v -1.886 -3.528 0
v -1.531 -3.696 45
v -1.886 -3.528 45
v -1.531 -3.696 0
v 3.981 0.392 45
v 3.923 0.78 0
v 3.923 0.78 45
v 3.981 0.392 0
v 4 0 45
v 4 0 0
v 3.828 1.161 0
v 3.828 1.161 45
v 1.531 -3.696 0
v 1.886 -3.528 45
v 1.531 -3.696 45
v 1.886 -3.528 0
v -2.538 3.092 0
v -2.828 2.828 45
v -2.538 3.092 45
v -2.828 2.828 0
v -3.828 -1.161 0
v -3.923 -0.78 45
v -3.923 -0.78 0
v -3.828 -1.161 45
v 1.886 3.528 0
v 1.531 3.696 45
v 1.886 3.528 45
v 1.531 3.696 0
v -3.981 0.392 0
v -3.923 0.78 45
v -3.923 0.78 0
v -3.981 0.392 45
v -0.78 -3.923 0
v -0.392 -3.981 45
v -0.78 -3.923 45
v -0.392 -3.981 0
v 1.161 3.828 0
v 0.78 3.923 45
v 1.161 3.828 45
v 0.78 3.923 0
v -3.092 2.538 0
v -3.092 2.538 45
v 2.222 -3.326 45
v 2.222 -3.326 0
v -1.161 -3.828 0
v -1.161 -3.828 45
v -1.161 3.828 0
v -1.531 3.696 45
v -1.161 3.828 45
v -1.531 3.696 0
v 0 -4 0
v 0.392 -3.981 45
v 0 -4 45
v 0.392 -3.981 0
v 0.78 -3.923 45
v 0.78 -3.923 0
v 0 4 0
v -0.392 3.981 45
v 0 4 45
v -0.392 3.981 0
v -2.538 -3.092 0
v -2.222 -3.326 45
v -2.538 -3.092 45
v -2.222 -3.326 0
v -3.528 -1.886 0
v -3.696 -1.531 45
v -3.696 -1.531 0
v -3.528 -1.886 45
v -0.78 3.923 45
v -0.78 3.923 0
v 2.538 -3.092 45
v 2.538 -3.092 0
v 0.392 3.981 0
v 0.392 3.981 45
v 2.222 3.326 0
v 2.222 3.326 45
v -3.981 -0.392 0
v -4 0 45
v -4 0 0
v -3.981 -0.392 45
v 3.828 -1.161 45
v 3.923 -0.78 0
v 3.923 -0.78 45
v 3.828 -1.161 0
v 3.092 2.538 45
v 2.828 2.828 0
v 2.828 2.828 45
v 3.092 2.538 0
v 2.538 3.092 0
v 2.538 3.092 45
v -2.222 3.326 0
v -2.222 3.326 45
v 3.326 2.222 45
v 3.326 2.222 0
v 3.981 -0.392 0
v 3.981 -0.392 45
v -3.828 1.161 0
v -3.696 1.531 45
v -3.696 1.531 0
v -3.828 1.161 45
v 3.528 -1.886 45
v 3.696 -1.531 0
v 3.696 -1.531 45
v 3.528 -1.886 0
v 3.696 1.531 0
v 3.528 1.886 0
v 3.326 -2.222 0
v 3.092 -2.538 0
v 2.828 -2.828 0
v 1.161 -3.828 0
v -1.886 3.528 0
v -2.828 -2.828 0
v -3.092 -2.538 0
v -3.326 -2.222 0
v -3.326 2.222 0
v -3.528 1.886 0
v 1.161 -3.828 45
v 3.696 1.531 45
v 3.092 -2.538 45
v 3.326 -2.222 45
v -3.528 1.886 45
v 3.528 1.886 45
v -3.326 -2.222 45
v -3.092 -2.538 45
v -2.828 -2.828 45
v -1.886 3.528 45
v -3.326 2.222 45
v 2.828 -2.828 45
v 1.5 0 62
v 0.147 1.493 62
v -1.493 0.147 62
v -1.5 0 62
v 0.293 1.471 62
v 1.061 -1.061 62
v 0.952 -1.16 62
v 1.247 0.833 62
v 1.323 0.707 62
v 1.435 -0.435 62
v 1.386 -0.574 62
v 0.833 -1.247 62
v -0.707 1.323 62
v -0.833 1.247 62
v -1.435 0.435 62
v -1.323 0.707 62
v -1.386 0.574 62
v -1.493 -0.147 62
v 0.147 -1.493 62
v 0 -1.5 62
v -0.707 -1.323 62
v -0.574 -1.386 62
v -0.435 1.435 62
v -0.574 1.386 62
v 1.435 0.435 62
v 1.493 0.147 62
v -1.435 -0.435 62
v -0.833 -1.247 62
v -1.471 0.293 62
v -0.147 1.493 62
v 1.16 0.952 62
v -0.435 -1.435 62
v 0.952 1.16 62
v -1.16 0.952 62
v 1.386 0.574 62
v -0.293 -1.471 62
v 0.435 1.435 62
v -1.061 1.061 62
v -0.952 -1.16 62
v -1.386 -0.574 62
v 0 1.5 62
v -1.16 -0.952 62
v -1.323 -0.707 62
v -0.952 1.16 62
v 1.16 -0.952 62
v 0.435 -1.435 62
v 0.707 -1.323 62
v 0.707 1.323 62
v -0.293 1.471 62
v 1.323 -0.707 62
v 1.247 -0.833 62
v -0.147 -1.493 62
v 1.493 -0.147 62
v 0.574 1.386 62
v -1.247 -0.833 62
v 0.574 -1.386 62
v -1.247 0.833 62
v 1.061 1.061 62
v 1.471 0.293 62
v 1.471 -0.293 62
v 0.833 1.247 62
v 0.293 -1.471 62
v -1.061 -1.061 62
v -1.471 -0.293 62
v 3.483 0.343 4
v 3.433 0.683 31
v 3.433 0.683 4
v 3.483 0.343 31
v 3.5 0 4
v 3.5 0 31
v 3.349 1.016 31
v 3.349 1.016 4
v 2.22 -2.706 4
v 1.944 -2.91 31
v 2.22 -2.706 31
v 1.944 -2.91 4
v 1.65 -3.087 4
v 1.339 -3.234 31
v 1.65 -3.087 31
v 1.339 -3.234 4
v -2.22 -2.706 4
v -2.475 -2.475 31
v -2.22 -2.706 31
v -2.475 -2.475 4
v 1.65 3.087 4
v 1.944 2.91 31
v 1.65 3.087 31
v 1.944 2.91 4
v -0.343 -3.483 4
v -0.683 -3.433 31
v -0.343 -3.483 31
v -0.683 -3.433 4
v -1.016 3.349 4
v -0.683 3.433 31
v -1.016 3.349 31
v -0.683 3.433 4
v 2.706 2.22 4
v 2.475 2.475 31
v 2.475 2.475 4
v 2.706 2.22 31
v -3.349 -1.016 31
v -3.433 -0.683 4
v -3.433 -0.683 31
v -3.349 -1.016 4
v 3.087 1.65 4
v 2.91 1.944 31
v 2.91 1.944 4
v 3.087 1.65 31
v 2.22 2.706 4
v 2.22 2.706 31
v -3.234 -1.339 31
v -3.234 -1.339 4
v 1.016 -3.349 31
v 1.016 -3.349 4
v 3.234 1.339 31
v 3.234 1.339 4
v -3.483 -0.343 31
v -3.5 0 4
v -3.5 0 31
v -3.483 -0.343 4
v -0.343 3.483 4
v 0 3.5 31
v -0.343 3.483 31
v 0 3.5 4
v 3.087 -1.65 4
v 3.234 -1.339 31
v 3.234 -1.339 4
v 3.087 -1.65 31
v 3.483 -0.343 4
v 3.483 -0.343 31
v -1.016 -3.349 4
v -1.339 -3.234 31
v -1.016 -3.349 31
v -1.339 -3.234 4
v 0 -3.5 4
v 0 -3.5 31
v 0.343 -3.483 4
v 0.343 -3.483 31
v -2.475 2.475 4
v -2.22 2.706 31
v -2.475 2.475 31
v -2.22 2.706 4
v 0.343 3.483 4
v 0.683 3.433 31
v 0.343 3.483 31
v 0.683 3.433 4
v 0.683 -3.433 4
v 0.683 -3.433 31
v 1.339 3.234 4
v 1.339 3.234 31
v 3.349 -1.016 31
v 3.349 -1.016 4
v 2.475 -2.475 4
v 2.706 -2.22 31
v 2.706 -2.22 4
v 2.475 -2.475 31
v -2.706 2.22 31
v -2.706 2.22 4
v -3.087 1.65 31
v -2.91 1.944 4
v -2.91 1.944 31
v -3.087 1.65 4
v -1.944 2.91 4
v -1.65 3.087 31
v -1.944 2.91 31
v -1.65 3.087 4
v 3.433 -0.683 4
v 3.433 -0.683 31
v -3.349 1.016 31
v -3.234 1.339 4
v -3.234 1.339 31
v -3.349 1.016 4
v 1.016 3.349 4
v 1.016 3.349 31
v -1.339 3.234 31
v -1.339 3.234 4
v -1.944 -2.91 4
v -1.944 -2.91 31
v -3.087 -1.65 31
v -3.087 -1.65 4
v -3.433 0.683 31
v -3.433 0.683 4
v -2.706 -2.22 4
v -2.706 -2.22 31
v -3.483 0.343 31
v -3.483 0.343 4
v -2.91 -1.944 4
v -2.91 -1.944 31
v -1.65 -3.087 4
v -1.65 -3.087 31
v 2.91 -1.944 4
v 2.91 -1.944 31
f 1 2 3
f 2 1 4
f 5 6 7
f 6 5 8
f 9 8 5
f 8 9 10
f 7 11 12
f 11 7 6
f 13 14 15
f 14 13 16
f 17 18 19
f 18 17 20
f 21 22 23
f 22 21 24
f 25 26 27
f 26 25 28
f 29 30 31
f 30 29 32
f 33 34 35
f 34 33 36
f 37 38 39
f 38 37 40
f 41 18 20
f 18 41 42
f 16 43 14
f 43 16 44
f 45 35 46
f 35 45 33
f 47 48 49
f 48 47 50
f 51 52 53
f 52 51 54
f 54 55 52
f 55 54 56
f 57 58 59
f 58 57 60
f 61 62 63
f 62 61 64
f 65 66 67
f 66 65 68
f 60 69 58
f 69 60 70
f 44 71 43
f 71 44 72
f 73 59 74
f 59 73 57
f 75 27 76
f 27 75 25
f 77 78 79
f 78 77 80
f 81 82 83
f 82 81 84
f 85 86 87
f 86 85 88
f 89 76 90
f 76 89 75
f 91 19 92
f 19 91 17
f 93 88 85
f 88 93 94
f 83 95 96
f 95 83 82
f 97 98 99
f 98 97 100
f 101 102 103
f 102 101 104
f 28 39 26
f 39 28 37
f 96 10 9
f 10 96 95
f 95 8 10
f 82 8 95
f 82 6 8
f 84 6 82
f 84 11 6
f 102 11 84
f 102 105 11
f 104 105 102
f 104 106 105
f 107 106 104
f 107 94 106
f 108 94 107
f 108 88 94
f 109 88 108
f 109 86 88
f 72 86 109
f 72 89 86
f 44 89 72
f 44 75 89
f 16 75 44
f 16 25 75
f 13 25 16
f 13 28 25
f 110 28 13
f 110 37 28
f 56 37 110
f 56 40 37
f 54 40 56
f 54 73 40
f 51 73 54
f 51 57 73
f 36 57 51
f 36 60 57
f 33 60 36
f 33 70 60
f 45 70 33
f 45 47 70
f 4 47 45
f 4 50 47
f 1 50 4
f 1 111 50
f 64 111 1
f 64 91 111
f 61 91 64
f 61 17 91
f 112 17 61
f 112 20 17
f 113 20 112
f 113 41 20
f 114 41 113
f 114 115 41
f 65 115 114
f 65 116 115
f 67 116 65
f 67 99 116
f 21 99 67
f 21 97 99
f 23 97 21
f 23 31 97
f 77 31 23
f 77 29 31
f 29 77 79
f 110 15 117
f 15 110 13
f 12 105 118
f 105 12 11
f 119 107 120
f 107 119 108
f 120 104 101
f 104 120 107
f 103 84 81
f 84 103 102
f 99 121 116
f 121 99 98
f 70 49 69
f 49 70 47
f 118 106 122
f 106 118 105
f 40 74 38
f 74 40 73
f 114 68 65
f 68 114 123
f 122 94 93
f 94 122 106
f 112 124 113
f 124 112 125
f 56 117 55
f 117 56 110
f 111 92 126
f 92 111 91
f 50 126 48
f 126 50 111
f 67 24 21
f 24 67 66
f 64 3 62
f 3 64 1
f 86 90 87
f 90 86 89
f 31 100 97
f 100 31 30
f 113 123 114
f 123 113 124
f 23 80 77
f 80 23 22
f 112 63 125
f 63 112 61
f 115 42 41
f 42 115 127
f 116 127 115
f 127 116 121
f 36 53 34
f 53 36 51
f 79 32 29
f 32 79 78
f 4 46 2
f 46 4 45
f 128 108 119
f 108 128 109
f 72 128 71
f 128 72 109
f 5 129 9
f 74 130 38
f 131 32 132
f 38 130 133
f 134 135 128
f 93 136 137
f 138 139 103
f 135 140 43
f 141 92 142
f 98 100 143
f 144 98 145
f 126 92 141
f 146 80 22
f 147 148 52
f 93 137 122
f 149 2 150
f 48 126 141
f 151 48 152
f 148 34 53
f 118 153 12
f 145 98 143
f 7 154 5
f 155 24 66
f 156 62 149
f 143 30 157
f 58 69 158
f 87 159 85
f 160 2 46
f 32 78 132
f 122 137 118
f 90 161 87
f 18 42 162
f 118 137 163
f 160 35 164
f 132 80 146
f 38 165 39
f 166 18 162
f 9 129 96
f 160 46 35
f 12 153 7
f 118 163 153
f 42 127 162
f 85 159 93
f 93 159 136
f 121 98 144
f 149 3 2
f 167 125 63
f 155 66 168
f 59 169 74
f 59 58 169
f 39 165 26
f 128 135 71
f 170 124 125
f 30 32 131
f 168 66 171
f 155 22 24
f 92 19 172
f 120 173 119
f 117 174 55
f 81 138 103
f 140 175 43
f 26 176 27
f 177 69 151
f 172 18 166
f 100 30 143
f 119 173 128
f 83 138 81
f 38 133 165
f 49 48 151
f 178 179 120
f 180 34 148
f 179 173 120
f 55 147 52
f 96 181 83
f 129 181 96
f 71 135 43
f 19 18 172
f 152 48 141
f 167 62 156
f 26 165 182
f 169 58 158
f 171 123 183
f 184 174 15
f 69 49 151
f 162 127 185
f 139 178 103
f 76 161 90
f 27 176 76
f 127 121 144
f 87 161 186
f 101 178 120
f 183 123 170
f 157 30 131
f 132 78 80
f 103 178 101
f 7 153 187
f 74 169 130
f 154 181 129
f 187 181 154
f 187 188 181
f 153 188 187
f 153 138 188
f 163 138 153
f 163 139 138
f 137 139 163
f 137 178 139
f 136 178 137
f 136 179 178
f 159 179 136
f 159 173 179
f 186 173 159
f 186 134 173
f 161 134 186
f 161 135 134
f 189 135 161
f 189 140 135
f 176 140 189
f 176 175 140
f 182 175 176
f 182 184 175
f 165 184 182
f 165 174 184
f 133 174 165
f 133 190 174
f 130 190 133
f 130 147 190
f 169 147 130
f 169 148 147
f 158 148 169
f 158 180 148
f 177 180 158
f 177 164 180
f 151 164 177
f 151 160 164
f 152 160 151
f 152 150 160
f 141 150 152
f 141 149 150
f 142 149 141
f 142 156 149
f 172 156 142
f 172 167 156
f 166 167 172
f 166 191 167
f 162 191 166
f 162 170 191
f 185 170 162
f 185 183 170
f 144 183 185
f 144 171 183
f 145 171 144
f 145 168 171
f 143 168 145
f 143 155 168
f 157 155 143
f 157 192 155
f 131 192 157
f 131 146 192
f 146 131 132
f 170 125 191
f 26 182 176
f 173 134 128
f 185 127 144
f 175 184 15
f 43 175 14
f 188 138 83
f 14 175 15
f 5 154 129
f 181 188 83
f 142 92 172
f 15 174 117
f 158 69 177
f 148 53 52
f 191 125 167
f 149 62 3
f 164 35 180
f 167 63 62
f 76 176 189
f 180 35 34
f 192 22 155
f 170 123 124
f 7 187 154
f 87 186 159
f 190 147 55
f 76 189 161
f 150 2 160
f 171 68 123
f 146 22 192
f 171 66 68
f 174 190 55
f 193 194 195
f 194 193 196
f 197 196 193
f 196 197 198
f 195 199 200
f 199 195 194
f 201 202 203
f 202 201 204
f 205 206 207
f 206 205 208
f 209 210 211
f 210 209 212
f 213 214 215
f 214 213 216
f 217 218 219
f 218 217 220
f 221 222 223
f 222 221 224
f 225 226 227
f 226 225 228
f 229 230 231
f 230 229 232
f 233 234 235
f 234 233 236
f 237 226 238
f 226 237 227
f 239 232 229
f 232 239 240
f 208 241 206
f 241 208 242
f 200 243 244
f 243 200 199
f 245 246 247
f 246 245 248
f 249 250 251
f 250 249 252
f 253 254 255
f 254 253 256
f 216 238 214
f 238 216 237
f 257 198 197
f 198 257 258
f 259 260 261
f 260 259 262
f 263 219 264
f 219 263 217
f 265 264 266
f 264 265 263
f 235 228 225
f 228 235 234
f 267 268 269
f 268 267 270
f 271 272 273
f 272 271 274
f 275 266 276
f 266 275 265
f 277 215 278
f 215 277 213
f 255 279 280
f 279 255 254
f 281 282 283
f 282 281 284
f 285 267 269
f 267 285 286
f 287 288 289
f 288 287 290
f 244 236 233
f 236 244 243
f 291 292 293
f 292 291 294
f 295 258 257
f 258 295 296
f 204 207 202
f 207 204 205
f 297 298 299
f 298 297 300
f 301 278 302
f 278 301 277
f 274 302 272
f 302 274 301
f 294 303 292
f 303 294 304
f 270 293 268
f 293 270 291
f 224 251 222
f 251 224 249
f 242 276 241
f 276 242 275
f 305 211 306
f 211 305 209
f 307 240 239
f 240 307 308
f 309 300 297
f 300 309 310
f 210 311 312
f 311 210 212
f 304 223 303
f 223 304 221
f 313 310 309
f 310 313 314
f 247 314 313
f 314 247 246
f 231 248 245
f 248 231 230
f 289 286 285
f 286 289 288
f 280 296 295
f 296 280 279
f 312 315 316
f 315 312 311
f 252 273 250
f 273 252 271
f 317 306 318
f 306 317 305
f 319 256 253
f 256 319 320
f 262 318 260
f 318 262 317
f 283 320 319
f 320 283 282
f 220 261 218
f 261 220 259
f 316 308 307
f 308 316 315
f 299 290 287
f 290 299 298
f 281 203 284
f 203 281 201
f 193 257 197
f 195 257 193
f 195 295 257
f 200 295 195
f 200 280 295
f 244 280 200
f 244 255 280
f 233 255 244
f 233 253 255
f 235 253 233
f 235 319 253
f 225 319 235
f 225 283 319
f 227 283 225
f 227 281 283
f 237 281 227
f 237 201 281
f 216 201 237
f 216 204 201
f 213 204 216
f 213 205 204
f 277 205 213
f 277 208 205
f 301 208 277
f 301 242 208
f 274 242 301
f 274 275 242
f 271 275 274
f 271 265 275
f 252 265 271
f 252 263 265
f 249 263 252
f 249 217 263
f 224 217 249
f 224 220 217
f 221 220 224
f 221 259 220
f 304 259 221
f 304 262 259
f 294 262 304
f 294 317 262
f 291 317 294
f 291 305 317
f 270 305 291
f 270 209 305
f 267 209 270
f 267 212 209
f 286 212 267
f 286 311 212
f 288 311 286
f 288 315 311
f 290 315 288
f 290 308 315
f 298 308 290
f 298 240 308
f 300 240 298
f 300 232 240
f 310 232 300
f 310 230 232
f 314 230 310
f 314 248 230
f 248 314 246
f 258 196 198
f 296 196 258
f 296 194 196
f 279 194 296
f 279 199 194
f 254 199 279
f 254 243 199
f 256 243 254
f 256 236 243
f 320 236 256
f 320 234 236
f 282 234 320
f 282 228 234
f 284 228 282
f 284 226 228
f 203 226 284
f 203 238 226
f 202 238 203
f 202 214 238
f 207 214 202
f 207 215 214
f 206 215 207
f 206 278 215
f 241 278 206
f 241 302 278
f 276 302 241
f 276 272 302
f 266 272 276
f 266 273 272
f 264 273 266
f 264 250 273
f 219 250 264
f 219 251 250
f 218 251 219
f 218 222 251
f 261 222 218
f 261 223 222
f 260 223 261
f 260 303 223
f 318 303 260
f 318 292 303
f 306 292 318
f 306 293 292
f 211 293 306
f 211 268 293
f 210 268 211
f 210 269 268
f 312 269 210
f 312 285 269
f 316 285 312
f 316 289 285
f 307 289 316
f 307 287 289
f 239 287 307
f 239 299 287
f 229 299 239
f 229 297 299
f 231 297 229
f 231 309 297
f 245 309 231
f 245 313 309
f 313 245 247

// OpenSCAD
// Pestle for 1.5 mL microcentrifuge tube - printed standing upright.
// Dimensions in mm.

// Handle
h_d      = 8;      // Handle diameter
h_start  = 0;      // Handle start Z
h_end    = 45;     // Handle end Z

// Cone
c_d_top  = 8;      // Cone top diameter (at z=45)
c_d_bot  = 3;      // Cone bottom diameter (at z=62)
c_start  = 45;     // Cone start Z
c_end    = 62;     // Cone end Z

// Tip
tip_d    = 3;      // Tip diameter
tip_c    = 62;     // Tip center Z

// Grooves
g_count  = 4;      // Number of grooves
g_z      = [10, 15, 20, 25]; // Z positions of groove centers
g_w      = 2;      // Groove width (Z)
g_d      = 1;      // Groove depth

$fn = 64;

// Main body: Handle + Cone + Tip
difference() {
    union() {
        // 1. Cylindrical Handle
        translate([0, 0, h_start])
            cylinder(h = h_end - h_start, d = h_d);

        // 2. Cone (tapering from 8mm to 3mm)
        translate([0, 0, c_start])
            cylinder(h = c_end - c_start, d1 = c_d_top, d2 = c_d_bot);

        // 3. Rounded Tip (Sphere centered at z=62)
        translate([0, 0, tip_c - tip_d / 2])
            sphere(r = tip_d / 2);
    }

    // 4. Grooves (cut into the handle)
    // We cut a cylinder through the handle at each Z position.
    // The cylinder must extend significantly past the handle top/bottom to ensure clean cuts.
    for (i = [0 : g_count - 1]) {
        z_pos = g_z[i];
        // Extend the cut cylinder well beyond the handle boundaries (0 and 45)
        // to ensure it fully intersects the solid body regardless of mesh resolution.
        translate([0, 0, z_pos - g_w / 2 - 5])
            cylinder(h = g_w + 10, d = h_d - g_d);
    }
}
